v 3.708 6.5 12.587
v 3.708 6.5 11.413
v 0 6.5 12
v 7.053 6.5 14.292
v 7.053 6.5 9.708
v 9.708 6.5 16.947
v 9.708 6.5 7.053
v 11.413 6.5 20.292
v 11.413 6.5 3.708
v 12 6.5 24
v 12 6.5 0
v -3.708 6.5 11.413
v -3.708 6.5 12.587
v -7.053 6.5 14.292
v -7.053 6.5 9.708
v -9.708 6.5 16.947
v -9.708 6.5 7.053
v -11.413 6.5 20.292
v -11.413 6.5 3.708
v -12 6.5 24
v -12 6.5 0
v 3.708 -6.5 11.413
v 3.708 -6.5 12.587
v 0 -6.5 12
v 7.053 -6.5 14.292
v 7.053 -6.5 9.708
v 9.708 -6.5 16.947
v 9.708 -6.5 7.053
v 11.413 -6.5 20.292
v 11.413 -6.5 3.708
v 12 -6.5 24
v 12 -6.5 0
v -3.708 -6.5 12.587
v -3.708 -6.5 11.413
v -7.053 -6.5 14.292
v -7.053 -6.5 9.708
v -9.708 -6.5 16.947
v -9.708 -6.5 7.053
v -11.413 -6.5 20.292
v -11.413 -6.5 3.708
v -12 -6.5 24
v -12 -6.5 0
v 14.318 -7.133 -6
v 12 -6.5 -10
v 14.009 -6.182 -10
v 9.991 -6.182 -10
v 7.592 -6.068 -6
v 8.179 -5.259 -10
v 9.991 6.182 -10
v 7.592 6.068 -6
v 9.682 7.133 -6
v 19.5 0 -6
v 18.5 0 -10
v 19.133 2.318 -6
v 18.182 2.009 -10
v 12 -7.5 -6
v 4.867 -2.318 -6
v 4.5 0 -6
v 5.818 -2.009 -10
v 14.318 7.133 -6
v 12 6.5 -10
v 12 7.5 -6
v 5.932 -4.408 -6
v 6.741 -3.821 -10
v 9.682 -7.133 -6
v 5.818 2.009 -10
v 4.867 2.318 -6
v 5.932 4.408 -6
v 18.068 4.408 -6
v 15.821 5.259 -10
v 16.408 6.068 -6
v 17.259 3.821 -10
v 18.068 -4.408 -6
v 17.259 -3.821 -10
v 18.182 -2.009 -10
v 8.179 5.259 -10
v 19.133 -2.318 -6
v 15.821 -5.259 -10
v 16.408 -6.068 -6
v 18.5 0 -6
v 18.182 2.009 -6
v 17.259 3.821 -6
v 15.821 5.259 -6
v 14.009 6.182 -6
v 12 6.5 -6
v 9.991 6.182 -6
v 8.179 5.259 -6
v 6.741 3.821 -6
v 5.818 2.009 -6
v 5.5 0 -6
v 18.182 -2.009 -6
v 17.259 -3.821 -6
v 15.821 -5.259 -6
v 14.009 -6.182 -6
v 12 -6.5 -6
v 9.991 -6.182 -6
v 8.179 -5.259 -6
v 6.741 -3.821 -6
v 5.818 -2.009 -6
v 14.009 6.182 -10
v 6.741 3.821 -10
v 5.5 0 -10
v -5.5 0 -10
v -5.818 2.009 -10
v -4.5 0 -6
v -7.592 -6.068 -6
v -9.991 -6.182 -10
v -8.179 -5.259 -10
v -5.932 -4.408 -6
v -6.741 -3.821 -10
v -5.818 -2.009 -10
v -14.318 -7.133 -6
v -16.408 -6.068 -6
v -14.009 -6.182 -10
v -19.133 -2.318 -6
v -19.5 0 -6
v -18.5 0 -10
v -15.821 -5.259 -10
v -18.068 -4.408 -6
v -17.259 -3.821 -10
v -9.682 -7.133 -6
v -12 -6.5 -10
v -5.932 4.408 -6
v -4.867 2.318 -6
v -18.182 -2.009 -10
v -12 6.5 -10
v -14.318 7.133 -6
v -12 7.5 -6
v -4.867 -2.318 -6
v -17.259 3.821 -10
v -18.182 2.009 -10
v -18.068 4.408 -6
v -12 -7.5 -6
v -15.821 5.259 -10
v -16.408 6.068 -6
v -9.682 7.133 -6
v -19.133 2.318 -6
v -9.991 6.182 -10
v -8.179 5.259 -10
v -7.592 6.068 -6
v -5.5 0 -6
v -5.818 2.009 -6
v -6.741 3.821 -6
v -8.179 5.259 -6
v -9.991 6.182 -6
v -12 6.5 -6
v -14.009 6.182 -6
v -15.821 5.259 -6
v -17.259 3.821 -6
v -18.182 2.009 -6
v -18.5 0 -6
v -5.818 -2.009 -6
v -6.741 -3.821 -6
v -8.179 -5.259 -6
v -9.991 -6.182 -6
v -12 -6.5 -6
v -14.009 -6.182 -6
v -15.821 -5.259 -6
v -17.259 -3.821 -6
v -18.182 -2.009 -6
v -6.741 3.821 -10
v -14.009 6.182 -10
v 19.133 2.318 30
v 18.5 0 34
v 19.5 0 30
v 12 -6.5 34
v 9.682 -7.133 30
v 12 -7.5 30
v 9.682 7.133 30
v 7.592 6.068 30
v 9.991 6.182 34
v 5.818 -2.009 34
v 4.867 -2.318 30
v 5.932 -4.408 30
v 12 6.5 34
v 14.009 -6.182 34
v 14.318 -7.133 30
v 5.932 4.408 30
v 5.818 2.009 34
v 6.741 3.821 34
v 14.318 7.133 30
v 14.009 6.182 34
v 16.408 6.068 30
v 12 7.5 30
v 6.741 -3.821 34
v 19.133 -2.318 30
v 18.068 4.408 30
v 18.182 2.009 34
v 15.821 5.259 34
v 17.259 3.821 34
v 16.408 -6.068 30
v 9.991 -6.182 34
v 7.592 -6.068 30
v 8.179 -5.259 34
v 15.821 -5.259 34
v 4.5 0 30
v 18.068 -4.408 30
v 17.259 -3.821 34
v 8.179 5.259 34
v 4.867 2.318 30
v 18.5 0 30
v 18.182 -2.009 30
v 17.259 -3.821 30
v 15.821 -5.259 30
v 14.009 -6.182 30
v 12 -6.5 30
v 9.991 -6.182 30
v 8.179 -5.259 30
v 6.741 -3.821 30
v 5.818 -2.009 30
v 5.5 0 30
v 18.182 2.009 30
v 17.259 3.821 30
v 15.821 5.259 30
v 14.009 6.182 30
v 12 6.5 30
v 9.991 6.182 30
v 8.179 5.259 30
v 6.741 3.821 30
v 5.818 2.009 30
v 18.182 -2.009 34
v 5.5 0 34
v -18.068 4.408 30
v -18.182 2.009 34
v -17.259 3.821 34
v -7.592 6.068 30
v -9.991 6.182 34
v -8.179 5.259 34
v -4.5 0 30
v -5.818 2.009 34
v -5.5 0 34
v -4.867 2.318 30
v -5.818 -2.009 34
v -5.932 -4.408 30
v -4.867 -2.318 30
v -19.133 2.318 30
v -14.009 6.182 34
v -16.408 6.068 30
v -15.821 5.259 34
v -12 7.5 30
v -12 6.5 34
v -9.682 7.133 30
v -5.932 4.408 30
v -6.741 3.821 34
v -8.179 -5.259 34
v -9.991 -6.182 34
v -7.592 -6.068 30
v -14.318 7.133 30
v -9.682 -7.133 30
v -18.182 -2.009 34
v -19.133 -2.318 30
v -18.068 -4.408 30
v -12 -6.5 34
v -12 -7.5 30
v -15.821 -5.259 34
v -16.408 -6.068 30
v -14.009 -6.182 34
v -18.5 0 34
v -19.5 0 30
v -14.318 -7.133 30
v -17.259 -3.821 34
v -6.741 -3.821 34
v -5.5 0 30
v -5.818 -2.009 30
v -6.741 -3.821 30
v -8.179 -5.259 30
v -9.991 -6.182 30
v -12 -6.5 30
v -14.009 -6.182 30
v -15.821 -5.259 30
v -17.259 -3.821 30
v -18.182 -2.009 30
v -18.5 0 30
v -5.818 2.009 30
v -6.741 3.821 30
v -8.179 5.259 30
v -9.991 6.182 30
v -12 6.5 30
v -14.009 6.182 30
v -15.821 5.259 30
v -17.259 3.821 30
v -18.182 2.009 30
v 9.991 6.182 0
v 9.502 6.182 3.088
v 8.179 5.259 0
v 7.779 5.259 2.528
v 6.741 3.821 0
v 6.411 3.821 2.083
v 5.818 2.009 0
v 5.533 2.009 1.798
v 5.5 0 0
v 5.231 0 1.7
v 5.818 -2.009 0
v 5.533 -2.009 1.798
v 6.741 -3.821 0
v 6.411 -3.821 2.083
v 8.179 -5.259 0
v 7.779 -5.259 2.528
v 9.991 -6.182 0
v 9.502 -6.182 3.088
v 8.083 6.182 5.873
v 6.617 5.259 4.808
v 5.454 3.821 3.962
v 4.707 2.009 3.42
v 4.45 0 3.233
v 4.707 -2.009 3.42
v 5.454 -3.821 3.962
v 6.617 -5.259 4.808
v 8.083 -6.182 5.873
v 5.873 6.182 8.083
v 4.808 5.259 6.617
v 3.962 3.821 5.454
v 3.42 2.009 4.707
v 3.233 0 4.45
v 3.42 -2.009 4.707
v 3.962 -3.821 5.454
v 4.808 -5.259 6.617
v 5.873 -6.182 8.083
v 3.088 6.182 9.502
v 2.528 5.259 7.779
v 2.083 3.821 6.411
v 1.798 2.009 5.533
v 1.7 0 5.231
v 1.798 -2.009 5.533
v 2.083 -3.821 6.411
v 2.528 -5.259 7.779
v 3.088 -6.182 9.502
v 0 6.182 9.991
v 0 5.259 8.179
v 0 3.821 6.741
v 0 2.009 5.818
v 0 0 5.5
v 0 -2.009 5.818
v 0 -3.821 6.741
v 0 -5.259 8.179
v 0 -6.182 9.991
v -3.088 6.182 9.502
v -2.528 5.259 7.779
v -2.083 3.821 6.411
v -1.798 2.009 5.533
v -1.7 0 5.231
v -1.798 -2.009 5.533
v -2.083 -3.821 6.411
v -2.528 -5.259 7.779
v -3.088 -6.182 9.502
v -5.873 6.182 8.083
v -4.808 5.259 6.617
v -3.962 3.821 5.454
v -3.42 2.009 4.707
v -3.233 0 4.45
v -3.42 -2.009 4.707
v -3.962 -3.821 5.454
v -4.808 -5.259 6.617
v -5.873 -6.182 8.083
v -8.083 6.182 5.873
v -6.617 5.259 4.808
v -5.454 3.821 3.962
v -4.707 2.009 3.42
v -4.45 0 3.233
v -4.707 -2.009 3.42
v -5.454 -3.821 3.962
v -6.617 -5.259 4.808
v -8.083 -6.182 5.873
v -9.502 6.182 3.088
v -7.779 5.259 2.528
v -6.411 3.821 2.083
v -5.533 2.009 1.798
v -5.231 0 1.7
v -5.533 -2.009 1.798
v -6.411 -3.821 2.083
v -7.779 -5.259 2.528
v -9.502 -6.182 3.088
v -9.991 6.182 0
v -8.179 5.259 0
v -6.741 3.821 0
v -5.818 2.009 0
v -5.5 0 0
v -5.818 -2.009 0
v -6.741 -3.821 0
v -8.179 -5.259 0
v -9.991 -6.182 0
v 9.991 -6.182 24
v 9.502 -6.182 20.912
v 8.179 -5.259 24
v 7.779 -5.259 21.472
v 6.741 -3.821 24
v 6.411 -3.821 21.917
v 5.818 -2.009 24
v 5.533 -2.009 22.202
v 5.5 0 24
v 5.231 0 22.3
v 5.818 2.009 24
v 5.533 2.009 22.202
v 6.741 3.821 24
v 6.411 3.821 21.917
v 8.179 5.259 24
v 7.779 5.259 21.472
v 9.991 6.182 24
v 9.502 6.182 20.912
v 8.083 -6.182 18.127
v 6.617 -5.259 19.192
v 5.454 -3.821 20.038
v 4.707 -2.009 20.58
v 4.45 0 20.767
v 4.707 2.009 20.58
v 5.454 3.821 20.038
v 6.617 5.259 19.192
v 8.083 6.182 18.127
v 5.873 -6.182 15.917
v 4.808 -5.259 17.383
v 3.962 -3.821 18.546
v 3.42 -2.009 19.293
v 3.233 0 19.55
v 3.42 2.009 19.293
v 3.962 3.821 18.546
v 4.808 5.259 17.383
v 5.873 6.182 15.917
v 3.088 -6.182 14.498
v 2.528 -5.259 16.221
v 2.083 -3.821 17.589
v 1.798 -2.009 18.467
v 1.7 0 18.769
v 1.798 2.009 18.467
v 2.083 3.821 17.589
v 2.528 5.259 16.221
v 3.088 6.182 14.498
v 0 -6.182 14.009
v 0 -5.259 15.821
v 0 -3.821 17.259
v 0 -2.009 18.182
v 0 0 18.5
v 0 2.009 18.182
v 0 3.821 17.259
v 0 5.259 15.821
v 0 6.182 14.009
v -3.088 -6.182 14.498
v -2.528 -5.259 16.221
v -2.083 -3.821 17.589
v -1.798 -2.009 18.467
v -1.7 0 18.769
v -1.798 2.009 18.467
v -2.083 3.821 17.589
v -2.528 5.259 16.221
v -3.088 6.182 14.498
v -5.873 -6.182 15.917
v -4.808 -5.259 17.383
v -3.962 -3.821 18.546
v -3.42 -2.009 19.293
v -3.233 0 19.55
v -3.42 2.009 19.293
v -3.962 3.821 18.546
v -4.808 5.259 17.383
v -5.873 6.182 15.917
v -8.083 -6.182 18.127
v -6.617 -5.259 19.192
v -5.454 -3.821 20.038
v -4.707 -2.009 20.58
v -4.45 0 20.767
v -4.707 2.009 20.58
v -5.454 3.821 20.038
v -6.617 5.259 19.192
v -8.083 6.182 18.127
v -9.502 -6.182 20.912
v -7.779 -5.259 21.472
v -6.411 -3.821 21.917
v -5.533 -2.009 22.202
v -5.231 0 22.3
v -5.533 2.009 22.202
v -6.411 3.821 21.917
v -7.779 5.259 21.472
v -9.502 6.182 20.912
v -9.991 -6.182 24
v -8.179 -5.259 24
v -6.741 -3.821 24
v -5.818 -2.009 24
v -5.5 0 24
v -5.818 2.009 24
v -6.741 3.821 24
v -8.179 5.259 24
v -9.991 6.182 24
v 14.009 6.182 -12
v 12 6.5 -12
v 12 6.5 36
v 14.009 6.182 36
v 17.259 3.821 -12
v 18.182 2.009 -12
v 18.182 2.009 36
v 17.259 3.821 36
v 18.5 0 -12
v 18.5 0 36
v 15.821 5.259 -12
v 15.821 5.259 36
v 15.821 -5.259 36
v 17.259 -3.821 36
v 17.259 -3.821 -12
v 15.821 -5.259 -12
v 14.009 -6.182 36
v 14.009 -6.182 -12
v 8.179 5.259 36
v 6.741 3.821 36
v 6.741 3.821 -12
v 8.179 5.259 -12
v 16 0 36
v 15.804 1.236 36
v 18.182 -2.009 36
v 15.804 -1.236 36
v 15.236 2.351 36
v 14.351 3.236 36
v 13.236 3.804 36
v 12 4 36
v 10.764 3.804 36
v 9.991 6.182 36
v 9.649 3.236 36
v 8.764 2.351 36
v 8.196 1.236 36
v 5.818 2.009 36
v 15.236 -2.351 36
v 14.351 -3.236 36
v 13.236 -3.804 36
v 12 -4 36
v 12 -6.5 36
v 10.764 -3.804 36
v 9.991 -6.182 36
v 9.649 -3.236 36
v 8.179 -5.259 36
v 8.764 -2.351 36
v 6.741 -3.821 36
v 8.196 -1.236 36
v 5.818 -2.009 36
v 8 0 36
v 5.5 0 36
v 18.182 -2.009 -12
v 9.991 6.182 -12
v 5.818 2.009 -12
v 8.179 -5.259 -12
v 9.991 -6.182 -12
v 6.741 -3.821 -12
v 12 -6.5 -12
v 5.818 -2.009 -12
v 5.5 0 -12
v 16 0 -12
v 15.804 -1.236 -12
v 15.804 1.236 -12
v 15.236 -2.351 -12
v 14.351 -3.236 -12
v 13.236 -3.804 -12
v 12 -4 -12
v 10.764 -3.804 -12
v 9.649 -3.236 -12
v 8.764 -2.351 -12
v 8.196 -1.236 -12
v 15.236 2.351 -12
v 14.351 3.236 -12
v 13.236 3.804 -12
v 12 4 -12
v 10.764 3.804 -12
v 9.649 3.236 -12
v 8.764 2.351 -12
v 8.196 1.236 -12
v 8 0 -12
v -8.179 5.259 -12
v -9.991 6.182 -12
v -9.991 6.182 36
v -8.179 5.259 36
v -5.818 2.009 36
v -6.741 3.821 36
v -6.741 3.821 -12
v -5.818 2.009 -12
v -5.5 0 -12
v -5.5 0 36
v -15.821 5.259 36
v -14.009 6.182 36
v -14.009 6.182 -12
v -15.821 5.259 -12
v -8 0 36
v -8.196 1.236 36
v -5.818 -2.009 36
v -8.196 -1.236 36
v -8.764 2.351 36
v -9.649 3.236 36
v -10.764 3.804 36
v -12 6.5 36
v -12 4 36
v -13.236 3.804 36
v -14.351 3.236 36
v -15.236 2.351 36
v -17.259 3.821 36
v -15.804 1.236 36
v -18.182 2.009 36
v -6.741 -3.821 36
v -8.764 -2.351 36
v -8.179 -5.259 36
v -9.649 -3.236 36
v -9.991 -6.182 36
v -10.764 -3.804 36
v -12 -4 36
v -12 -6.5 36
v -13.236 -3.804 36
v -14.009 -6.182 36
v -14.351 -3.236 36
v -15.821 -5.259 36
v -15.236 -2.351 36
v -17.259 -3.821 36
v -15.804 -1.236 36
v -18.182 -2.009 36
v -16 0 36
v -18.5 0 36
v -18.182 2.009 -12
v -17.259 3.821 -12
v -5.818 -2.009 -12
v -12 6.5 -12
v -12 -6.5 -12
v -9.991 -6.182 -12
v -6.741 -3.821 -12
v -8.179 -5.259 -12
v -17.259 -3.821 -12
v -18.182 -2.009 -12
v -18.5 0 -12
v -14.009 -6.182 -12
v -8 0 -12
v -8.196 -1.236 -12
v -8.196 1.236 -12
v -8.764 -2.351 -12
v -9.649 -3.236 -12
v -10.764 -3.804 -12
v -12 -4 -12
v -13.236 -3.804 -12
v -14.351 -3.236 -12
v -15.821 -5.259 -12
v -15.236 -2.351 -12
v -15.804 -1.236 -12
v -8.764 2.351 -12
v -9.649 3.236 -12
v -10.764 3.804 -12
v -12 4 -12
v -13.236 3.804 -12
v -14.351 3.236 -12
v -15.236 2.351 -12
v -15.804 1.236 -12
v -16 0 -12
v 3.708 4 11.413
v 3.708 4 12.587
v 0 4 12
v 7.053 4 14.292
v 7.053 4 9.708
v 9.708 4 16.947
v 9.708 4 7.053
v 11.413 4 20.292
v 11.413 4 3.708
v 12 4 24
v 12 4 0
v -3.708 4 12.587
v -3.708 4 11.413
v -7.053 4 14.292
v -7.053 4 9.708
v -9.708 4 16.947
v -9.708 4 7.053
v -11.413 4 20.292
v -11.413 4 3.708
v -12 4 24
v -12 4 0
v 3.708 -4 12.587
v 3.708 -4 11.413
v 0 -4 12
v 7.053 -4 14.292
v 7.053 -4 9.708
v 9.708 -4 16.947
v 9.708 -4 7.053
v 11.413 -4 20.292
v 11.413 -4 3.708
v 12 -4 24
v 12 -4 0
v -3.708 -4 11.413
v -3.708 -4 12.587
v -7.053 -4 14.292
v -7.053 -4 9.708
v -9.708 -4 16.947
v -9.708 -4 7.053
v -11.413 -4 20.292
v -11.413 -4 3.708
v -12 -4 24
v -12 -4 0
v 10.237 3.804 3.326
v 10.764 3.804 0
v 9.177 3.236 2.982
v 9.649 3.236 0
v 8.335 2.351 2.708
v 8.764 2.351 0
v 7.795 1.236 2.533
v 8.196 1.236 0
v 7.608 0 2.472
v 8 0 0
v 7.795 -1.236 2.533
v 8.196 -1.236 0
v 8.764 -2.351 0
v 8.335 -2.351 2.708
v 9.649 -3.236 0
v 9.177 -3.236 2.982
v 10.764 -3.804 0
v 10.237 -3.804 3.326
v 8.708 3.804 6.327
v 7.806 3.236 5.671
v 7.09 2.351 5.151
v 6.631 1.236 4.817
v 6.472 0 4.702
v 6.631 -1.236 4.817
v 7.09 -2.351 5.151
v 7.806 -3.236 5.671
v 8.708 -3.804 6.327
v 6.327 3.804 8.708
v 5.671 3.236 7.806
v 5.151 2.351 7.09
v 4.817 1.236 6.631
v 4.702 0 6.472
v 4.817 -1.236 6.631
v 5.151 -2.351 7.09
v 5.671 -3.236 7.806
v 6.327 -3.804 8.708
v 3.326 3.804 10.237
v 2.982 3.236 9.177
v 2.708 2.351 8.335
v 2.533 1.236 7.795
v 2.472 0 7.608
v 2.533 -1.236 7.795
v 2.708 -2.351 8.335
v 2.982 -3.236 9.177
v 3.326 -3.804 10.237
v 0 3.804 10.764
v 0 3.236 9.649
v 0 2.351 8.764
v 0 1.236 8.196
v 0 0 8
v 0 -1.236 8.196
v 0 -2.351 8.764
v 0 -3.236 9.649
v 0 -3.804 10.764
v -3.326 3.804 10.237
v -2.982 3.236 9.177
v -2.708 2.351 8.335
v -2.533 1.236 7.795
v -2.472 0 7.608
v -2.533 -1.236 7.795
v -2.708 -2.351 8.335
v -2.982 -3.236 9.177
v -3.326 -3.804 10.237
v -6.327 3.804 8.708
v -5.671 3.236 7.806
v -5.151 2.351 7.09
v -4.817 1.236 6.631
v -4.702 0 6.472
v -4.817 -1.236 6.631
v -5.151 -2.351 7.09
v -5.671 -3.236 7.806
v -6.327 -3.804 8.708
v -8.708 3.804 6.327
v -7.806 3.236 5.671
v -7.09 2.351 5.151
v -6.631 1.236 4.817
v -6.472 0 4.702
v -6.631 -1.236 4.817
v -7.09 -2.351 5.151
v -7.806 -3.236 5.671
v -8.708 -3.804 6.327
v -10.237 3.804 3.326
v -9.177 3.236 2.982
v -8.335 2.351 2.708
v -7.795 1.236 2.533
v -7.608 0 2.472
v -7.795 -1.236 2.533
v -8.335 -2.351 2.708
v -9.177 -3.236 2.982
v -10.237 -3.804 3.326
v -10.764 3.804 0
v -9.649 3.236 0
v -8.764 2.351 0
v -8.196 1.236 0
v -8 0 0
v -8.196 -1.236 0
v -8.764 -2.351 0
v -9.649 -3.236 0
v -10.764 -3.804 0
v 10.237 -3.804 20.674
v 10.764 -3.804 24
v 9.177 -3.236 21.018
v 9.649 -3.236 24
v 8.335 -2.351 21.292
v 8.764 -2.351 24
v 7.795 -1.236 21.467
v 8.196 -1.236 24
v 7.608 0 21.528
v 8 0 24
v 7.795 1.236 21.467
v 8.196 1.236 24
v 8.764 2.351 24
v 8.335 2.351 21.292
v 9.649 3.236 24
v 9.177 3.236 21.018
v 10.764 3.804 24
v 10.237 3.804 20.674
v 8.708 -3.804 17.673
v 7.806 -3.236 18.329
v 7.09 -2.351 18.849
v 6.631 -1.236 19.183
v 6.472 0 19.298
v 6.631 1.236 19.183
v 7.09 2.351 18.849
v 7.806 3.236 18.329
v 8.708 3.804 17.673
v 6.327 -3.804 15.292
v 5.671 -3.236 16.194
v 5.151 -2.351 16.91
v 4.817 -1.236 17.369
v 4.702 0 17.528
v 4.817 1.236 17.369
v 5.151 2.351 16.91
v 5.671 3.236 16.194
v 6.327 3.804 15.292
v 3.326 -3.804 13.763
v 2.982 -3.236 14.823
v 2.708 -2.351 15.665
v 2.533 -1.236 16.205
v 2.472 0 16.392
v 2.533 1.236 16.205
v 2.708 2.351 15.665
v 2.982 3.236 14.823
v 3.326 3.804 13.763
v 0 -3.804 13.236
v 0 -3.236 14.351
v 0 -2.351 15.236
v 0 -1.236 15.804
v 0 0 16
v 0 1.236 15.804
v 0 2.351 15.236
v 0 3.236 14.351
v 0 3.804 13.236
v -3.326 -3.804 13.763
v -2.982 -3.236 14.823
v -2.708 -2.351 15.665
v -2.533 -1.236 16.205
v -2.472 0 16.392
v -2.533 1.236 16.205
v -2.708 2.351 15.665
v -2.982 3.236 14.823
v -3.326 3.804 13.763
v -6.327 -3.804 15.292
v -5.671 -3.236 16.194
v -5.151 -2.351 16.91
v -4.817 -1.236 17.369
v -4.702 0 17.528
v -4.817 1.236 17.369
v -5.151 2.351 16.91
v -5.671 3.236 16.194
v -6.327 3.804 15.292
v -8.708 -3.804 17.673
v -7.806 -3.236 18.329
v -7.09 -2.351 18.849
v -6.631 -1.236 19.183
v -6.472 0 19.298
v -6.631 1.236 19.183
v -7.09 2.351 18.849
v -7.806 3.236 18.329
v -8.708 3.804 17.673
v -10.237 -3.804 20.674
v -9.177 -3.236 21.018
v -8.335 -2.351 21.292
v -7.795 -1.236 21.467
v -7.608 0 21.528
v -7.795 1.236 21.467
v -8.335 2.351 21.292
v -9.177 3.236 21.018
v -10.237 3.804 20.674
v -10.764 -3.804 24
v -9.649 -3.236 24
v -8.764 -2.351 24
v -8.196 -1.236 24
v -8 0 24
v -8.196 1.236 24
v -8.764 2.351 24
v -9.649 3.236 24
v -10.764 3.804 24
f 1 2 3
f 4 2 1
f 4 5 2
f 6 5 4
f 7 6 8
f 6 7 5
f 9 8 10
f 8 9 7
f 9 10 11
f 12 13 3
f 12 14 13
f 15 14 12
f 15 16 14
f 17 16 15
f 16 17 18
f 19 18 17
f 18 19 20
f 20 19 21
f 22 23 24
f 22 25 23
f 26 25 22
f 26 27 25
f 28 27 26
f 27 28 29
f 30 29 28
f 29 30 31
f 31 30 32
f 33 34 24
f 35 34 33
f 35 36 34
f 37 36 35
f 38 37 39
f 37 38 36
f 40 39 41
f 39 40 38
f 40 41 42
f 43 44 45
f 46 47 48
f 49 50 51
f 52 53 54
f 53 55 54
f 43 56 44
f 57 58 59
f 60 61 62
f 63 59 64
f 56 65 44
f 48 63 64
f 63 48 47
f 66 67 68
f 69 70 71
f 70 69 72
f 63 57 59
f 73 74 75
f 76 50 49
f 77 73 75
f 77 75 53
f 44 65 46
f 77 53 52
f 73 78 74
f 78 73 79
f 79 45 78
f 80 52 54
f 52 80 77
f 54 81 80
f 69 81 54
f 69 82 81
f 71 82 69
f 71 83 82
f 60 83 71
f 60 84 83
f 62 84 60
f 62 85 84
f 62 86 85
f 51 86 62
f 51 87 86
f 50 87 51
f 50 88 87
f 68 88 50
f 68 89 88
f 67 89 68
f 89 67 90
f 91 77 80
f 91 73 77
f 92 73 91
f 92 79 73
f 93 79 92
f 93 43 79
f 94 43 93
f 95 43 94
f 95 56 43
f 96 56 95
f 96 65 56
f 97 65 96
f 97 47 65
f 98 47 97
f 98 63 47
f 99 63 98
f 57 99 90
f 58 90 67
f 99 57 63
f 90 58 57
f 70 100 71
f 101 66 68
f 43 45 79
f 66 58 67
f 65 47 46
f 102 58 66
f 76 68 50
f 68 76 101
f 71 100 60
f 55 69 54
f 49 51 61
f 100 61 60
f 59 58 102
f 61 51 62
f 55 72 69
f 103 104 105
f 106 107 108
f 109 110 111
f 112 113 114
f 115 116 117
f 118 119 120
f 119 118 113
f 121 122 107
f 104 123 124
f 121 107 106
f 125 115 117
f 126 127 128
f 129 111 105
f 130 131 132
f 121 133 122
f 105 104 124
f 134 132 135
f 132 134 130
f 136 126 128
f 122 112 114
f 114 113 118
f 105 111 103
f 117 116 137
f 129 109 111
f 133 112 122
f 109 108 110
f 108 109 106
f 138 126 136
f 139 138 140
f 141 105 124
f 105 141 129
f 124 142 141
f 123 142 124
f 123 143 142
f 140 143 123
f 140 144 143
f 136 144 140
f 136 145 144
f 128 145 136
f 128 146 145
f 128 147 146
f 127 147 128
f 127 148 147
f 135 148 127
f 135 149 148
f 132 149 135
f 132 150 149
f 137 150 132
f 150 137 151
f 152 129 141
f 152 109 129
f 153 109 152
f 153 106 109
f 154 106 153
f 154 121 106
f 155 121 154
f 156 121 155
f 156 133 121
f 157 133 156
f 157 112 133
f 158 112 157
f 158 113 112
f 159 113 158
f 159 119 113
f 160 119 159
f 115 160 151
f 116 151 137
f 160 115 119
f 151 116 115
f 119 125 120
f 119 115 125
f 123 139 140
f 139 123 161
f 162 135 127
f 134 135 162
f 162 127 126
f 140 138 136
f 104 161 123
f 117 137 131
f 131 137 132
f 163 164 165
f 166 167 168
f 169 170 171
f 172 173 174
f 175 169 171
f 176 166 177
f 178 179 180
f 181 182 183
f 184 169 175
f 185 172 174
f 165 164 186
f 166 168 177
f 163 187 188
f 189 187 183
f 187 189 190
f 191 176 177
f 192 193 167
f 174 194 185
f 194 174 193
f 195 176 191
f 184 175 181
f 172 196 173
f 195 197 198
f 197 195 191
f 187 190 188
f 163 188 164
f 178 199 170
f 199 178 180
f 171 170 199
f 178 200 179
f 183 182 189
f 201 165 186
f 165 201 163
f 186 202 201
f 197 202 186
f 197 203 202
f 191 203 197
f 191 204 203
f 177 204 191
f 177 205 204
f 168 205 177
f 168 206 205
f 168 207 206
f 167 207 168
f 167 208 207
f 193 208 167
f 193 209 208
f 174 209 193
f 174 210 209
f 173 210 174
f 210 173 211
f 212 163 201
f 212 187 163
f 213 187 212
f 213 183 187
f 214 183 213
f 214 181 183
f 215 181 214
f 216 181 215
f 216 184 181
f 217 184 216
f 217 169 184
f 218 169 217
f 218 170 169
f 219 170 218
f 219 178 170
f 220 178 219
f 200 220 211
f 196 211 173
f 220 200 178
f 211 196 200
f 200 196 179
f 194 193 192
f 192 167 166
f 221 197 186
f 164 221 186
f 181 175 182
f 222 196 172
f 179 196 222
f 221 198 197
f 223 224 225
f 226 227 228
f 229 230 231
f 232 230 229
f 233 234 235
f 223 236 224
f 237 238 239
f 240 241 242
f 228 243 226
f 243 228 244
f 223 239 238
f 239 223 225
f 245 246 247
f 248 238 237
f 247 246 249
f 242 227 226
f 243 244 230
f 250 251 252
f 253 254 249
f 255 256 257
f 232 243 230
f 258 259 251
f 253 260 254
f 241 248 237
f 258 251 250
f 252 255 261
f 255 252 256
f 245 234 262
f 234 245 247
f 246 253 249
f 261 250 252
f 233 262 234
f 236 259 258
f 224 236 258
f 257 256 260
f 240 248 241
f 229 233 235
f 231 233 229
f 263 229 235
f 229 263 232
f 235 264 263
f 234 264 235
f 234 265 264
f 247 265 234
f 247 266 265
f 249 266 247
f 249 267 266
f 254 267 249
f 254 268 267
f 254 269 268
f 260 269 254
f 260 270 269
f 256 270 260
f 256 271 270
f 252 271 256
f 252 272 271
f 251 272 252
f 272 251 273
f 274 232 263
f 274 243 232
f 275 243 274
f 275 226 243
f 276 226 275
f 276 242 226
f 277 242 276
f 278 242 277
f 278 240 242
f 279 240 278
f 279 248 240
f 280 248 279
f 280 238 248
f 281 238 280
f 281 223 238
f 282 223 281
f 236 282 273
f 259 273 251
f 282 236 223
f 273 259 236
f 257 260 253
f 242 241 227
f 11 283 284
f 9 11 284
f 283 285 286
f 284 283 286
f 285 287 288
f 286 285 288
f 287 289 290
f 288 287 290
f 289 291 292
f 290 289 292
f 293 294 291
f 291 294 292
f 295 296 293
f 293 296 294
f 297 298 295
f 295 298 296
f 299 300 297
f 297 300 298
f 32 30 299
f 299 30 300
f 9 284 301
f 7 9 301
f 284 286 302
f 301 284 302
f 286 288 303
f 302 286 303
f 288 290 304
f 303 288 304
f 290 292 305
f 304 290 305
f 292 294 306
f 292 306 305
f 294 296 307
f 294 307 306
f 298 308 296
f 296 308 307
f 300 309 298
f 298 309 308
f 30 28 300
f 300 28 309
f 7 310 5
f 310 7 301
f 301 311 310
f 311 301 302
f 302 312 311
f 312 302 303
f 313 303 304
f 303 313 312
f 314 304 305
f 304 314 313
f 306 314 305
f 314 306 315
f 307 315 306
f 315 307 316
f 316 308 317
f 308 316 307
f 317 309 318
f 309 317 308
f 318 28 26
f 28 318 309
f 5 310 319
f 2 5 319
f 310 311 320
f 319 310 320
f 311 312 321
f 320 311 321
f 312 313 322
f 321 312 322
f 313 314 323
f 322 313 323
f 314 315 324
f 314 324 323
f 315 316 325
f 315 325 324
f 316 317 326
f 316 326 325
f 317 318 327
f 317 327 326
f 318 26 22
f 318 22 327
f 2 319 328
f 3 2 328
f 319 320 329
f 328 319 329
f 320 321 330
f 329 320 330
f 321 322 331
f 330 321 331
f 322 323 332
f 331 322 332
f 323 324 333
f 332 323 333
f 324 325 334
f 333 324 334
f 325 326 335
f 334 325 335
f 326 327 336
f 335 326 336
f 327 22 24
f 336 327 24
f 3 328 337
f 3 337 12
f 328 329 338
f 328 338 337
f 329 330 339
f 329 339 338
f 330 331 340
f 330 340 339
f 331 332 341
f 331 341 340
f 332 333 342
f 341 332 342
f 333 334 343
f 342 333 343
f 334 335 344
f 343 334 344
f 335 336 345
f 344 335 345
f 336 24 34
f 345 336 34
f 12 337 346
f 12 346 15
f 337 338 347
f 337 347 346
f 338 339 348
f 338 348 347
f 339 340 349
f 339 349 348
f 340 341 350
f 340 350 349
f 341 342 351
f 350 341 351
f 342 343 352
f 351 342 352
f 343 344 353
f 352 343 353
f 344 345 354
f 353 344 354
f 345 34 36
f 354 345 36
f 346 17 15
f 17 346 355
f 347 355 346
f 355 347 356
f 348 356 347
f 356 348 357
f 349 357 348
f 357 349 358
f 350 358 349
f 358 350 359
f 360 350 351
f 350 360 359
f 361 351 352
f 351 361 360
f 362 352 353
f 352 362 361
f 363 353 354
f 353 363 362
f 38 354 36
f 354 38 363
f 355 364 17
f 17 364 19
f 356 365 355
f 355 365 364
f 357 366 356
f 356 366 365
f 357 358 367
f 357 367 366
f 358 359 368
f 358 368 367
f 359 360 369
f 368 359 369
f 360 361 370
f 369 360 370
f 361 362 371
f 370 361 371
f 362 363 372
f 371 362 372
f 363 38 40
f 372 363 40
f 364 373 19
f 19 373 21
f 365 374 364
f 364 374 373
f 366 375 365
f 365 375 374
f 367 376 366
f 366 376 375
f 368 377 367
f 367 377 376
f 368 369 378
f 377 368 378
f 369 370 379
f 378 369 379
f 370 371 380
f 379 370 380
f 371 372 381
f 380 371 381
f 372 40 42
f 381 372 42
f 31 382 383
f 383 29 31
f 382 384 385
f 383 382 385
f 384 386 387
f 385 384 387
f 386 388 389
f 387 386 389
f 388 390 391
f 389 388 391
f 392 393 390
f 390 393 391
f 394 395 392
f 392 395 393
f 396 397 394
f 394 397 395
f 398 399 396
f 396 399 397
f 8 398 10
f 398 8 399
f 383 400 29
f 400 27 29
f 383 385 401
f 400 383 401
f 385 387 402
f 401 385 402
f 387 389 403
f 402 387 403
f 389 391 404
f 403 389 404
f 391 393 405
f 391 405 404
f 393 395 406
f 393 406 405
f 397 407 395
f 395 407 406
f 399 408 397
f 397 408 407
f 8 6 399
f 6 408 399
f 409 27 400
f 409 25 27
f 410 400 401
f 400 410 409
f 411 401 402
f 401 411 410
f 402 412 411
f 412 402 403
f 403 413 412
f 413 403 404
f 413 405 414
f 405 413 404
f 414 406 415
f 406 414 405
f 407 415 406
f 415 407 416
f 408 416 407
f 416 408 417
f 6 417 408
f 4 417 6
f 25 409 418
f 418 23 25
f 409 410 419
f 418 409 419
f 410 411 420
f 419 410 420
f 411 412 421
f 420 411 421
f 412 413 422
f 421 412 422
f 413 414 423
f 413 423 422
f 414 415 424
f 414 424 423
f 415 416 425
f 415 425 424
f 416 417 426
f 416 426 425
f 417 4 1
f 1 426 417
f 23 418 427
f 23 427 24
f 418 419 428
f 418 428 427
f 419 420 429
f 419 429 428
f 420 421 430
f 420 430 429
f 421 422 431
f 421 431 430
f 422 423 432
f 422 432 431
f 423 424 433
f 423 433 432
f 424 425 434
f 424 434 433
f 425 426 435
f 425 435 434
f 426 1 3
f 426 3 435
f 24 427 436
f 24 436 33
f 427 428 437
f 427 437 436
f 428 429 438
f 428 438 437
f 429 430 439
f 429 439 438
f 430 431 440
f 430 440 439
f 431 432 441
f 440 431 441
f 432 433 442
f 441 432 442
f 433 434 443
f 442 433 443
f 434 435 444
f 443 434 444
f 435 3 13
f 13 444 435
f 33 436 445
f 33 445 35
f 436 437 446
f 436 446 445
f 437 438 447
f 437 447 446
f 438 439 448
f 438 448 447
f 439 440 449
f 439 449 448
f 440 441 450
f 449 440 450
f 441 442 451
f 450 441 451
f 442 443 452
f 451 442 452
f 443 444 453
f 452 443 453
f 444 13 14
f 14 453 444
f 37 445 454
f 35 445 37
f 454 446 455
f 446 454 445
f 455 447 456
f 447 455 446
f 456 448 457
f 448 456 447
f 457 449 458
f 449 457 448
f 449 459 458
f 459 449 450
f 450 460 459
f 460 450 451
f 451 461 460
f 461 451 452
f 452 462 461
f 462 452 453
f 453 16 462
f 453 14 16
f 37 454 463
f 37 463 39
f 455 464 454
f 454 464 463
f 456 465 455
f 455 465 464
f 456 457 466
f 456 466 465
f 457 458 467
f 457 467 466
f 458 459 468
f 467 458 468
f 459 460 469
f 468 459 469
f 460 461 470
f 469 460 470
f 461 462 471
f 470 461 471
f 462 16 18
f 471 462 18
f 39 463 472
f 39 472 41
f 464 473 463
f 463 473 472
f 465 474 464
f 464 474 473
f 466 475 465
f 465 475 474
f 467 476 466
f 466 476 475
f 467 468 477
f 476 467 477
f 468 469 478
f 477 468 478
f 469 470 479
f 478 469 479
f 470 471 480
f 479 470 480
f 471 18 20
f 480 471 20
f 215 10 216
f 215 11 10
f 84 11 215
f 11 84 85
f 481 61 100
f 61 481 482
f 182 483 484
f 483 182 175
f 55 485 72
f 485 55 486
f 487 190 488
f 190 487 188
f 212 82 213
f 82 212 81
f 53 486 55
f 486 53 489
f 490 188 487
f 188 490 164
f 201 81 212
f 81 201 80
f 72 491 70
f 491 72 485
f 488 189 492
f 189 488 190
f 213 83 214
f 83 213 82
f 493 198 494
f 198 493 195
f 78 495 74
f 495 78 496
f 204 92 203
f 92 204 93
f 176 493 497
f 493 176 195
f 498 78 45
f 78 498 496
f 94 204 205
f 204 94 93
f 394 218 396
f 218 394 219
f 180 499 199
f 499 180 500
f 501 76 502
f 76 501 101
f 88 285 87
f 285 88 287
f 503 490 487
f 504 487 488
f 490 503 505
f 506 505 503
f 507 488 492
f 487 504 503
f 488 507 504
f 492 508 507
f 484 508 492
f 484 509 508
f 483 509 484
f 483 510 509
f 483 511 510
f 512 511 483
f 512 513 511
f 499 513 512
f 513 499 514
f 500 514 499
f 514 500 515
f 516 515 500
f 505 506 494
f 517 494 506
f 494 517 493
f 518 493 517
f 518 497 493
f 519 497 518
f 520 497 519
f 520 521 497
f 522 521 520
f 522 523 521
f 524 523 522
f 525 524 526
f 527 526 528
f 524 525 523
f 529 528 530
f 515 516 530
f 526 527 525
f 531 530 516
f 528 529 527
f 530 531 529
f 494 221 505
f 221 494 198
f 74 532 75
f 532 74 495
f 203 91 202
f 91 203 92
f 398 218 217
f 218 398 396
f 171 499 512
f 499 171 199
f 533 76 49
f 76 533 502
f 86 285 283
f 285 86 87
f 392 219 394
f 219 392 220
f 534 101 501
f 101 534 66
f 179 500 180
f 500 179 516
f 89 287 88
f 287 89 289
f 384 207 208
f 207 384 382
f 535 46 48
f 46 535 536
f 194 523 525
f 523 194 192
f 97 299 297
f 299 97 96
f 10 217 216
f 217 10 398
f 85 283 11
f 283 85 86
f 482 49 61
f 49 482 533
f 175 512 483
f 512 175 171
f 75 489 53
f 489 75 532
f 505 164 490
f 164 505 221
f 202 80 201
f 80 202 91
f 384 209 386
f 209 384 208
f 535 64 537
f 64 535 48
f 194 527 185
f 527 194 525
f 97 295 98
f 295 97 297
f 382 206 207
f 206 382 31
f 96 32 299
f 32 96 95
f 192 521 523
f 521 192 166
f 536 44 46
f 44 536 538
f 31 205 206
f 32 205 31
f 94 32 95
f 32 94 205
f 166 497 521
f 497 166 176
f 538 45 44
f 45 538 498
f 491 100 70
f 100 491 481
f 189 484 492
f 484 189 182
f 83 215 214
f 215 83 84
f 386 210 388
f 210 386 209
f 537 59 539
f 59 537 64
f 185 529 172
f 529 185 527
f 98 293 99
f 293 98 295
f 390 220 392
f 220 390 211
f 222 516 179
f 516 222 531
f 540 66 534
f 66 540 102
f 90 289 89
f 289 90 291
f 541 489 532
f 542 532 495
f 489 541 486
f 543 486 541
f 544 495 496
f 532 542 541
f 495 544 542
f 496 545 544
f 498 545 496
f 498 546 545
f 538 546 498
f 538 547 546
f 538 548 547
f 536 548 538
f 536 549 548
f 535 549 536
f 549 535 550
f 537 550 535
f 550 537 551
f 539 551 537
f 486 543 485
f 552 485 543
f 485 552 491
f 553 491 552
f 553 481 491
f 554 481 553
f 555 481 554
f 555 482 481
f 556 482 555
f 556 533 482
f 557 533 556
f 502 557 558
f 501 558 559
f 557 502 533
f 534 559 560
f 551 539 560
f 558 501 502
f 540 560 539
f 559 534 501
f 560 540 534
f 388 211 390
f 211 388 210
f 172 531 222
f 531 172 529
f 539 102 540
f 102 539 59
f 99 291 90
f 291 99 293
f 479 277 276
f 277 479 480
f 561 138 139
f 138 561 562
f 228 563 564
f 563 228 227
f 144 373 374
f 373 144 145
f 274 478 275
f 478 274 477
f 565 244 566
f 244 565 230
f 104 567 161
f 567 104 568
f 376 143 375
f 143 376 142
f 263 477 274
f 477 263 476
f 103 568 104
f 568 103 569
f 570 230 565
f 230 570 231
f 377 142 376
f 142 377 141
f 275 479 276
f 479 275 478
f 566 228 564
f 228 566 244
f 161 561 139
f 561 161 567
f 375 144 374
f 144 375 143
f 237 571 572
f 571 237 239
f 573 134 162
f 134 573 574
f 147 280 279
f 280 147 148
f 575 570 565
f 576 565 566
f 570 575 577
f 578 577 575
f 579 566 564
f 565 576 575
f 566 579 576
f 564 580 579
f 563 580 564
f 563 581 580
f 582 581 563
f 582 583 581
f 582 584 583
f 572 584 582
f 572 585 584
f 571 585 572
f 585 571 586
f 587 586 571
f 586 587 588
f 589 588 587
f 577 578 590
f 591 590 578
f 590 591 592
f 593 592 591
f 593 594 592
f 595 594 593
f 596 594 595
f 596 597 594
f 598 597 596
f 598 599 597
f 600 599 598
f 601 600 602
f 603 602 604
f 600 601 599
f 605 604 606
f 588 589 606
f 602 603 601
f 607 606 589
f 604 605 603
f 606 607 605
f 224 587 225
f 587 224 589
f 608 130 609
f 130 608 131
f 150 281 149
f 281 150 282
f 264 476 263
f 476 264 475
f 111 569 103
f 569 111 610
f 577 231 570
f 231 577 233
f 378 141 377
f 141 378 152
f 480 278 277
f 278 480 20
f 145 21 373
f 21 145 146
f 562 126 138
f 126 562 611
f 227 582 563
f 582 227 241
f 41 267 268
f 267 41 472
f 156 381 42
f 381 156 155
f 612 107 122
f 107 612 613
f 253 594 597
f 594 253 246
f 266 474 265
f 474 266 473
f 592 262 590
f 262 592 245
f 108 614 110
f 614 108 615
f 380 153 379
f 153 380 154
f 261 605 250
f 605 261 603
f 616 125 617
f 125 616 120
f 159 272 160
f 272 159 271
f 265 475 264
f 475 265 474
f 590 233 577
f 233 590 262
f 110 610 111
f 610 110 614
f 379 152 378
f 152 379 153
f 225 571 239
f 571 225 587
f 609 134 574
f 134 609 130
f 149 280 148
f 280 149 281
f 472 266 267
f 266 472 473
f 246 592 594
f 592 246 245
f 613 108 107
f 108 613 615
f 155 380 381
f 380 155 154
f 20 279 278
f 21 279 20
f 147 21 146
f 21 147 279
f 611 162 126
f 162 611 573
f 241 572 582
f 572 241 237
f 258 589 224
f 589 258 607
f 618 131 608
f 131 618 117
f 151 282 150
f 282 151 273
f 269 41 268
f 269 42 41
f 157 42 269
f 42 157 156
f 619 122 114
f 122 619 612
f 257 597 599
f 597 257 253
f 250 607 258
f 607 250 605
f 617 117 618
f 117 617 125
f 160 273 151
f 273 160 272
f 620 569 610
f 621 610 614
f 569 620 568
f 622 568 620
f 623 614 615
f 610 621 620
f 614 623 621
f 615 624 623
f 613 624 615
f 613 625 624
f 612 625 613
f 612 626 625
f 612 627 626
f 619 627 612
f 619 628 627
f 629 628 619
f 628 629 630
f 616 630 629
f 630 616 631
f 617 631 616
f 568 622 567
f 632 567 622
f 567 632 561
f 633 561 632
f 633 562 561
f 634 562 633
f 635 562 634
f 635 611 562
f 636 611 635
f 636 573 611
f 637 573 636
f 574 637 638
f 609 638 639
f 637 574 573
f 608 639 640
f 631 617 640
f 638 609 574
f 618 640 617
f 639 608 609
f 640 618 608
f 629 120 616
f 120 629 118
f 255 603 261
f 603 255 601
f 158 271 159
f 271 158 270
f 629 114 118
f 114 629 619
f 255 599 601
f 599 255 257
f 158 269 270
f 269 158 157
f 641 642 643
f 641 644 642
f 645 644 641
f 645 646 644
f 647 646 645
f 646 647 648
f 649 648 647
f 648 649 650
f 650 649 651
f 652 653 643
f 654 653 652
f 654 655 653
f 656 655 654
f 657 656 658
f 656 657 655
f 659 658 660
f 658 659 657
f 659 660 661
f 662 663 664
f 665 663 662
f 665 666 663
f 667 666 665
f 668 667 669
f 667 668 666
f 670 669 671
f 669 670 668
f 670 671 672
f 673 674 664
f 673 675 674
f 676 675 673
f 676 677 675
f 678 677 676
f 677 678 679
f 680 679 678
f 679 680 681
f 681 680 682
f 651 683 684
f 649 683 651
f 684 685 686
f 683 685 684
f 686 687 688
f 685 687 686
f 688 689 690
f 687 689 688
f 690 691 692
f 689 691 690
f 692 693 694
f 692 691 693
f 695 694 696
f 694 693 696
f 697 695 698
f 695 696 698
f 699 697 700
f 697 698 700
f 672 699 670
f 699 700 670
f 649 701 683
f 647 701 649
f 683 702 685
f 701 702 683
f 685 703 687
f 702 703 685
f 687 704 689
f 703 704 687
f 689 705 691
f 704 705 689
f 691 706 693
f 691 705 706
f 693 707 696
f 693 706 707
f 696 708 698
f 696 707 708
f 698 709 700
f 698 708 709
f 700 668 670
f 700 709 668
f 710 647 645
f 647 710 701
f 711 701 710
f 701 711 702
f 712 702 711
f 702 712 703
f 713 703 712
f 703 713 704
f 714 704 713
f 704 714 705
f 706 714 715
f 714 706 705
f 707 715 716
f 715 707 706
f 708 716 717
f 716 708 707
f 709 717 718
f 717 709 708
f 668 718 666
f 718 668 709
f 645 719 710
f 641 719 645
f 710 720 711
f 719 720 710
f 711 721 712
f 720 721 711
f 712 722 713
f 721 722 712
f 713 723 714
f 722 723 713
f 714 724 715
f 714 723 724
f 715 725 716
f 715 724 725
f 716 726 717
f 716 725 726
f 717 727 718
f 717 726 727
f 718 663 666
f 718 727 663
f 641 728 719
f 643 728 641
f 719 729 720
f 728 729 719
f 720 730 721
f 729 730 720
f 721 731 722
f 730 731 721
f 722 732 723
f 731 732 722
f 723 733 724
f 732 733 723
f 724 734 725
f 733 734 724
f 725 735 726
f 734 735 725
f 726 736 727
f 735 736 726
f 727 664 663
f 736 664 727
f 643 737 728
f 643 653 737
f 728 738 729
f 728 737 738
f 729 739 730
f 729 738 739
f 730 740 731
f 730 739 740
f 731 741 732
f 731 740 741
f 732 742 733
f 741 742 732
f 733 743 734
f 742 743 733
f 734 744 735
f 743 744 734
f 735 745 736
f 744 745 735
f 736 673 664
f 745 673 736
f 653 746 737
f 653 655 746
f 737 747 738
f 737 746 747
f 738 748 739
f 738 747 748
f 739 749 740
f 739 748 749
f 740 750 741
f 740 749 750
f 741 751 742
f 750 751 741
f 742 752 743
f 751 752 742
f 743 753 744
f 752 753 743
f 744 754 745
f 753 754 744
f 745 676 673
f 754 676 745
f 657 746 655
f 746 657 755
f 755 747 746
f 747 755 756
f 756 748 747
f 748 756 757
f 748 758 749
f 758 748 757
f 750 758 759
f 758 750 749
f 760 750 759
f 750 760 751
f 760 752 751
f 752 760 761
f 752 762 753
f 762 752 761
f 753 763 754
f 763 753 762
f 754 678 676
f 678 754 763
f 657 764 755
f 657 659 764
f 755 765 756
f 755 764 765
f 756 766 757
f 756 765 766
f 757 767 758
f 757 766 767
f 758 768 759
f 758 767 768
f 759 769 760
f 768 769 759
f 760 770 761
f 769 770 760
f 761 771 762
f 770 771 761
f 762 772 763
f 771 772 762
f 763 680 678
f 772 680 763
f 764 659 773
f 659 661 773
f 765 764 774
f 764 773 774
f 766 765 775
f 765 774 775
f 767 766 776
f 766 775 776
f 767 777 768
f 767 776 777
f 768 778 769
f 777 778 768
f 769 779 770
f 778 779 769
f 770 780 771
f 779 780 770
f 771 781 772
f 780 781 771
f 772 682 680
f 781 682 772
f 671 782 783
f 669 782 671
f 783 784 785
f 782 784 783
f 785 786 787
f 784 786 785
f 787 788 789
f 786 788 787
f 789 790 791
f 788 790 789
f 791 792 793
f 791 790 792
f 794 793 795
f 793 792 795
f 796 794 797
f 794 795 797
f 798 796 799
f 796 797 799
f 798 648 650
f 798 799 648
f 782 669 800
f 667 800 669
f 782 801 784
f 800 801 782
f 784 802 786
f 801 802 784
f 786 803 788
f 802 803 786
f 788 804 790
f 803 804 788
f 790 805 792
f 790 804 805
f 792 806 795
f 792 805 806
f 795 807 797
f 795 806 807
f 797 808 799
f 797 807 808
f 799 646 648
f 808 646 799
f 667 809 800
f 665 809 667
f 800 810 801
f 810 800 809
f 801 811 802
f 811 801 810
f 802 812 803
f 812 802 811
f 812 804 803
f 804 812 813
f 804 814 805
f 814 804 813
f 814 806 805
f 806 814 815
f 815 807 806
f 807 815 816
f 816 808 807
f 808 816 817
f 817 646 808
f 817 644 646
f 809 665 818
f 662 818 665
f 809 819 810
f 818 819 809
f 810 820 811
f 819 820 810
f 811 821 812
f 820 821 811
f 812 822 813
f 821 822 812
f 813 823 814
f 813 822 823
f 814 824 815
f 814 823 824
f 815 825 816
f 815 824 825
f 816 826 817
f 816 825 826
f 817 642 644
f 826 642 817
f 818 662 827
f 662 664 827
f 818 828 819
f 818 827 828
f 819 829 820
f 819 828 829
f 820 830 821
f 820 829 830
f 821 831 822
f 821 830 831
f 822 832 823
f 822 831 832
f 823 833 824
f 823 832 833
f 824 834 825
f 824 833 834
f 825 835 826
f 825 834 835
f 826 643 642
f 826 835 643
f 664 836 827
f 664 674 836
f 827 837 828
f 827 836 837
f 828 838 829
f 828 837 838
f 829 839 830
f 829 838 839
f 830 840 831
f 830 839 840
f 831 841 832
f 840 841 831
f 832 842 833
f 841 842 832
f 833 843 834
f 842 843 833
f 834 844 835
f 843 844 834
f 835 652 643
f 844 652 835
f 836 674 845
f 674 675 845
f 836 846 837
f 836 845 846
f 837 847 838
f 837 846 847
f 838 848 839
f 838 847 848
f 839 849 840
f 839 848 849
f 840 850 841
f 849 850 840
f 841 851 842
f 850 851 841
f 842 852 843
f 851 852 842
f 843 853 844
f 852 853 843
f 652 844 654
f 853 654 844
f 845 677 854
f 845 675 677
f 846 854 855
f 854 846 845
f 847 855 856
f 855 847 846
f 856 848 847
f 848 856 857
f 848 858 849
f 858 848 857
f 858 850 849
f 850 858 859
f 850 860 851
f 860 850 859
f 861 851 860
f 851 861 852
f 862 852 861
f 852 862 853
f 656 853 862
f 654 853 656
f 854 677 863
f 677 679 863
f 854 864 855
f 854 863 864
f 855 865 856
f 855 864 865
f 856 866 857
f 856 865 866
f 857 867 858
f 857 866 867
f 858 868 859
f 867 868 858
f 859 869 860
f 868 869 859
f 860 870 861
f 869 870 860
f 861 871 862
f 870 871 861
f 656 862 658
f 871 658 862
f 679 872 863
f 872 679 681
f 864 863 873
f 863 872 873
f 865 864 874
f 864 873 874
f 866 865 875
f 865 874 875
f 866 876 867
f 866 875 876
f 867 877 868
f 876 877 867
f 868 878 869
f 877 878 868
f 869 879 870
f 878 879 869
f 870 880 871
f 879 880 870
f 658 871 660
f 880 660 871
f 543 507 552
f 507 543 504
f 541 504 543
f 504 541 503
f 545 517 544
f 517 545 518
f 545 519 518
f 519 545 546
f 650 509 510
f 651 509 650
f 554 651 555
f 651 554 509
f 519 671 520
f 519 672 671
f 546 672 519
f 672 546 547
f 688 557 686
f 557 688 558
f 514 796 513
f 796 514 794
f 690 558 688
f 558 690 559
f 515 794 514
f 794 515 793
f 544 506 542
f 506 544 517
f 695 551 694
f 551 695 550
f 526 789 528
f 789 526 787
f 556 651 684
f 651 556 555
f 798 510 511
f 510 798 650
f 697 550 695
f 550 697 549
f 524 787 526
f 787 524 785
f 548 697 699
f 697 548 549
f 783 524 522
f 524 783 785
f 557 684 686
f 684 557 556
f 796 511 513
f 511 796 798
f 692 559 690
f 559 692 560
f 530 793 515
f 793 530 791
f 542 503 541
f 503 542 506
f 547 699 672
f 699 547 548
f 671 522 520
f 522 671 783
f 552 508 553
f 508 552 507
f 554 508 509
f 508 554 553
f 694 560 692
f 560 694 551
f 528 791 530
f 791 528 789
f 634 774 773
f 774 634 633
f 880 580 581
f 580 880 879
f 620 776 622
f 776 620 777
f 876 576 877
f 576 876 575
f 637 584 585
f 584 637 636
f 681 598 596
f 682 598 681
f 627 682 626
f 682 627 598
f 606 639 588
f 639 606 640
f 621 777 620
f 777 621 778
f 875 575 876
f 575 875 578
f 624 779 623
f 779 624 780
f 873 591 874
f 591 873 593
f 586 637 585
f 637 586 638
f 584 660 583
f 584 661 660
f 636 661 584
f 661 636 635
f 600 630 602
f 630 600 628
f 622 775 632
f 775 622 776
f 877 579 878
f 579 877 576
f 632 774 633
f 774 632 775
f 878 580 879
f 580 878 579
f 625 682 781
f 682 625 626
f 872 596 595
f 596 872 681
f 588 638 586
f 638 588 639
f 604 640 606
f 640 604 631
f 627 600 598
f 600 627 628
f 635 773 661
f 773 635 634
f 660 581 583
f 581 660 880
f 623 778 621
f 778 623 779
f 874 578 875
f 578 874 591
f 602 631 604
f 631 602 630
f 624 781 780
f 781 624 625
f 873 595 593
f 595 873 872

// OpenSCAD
$fn = 20;

epsilon = 0.1;

jointOuterDiameter = 13;
jointInnerDiameter = 8;
jointFlaredDiameter = 15;

spigotLength = 15;
module Spigot()
{
    difference()
    {
        union()
        {
            cylinder(h=spigotLength,d=jointOuterDiameter);
            translate([0,0,7])
            cylinder(h=6,d1=jointFlaredDiameter,d2=jointOuterDiameter);
            
        }
        union()
        {
            translate([0,0,-epsilon])
            cylinder(h=spigotLength+2*epsilon,d=jointInnerDiameter);
        }
        
    }
    
}

bendRadius = 12;


module LittleH(diameter, bendRadius, armLength, addBarbs, barbDiameter, barbHeight, barbInset)
{

    
    
    rotate([90,0,0])
        rotate_extrude(convexity=10, angle=90) translate(v=[bendRadius,0,0]) circle(d=diameter); 

    translate([0,0,bendRadius*2])
        rotate([-90,0,0])
            rotate_extrude(convexity=10, angle=180) translate(v=[bendRadius,0,0]) circle(d=diameter); 
    translate([bendRadius,0,-armLength])
            cylinder(h=bendRadius*2+2*armLength,d=diameter);
    translate([-bendRadius,0,2*bendRadius])
            cylinder(h=armLength,d=diameter);
    
    if (addBarbs)
    {
        translate([bendRadius,0,-(armLength-barbInset)])
            cylinder(d1=diameter, d2=barbDiameter,  h=barbHeight);
        
        translate([bendRadius,0,2*bendRadius + armLength-barbInset-barbHeight])
            cylinder(d2=diameter, d1=barbDiameter,  h=barbHeight);
        
        translate([-bendRadius,0,2*bendRadius + armLength-barbInset-barbHeight])
            cylinder(d2=diameter, d1=barbDiameter,  h=barbHeight);
    }
}



module BigH(diameter, bendRadius, armLength, addBarbs, barbDiameter, barbHeight, barbInset)
{
    difference()
    {
        union()
        {
            translate([-bendRadius,-diameter/2,0])
                cube([2*bendRadius,diameter,bendRadius]);
        }
        union()
        {
            translate([0,(diameter+2*epsilon)/2,0])
            rotate([90,0,0])
                cylinder(r=bendRadius,h=diameter+2*epsilon);
        }
    }

    translate([0,0,2*bendRadius])
    rotate([0,180,0])
    difference()
    {
        union()
        {
            translate([-bendRadius,-diameter/2,0])
                cube([2*bendRadius,diameter,bendRadius]);
        }
        union()
        {
            translate([0,(diameter+2*epsilon)/2,0])
            rotate([90,0,0])
                cylinder(r=bendRadius,h=diameter+2*epsilon);
        }
    }

    
    rotate([90,0,0])
        rotate_extrude(convexity=10, angle=180) translate(v=[bendRadius,0,0]) circle(d=diameter); 

    translate([0,0,bendRadius*2])
        rotate([-90,0,0])
            rotate_extrude(convexity=10, angle=180) translate(v=[bendRadius,0,0]) circle(d=diameter); 
    translate([bendRadius,0,-armLength])
            cylinder(h=bendRadius*2+2*armLength,d=diameter);
    translate([-bendRadius,0,-armLength])
            cylinder(h=bendRadius*2+2*armLength,d=diameter);
    
    if (addBarbs)
    {
        translate([bendRadius,0,-(armLength-barbInset)])
            cylinder(d1=diameter, d2=barbDiameter,  h=barbHeight);
        
        translate([-bendRadius,0,-(armLength-barbInset)])
            cylinder(d1=diameter, d2=barbDiameter,  h=barbHeight);
        
        translate([bendRadius,0,2*bendRadius + armLength-barbInset-barbHeight])
            cylinder(d2=diameter, d1=barbDiameter,  h=barbHeight);
        
        translate([-bendRadius,0,2*bendRadius + armLength-barbInset-barbHeight])
            cylinder(d2=diameter, d1=barbDiameter,  h=barbHeight);
    }
}


module HJoint()
{
    intersection()
    {
        difference()
        {
            union()
            {
                rotate([90,0,0])
                     rotate_extrude(convexity=10, angle=90) translate(v=[bendRadius,0,0]) circle(d=jointOuterDiameter); 

                translate([0,0,bendRadius*2])
                    rotate([-90,0,0])
                        rotate_extrude(convexity=10, angle=180) translate(v=[bendRadius,0,0]) circle(d=jointOuterDiameter); 
 //               translate([-15,0,0])
  //                  cylinder(h=30,d=jointOuterDiameter);
                translate([bendRadius,0,0])
                    cylinder(h=30,d=jointOuterDiameter);
                
                
            }
            union()
            {
                rotate([90,0,0])
                     rotate_extrude(convexity=10, angle=90) translate(v=[bendRadius,0,0]) circle(d=jointInnerDiameter); 

                translate([0,0,bendRadius*2])
                    rotate([-90,0,0])
                        rotate_extrude(convexity=10, angle=180) translate(v=[bendRadius,0,0]) circle(d=jointInnerDiameter); 
                
                                
  //              translate([-15,0,0])
  //                  cylinder(h=30,d=jointInnerDiameter);
                translate([bendRadius,0,0])
                    cylinder(h=30,d=jointInnerDiameter);
            }
        }
        translate([-30,-30,0])
            cube([60,60,30]);
    }
    
//    translate([-15,0,0])
//    rotate([180,0,0])
 //       Spigot();
    translate([bendRadius,0,0])
        rotate([180,0])
        Spigot();
    
    translate([-bendRadius,0,bendRadius*2])
    
        Spigot();
    translate([bendRadius,0,bendRadius*2])
        Spigot();
}

module LittleHJoint()
{
    difference()
    {
    
        LittleH(jointOuterDiameter,12,12,true, jointFlaredDiameter,4,2);
        LittleH(jointInnerDiameter,12,12+epsilon,false, jointFlaredDiameter,4,2);
    }
}

module BigHJoint()
{
    difference()
    {
    
        BigH(jointOuterDiameter,12,12,true, jointFlaredDiameter,4,2);
        BigH(jointInnerDiameter,12,12+epsilon,false, jointFlaredDiameter,4,2);
    }
}


/*
intersection()
{
LittleHJoint();
//translate([0,5,15])
//rotate([-90,0,0])
//cylinder(d=3,h=10);

//translate([0,25,15])
//rotate([-90,0,0])
//cylinder(d=3,h=10);


//HJoint();
//translate([0,20,0])
//HJoint();
//translate([0,40,0])
//HJoint();
   // HJoint();
    translate([-50,0,-50])
    cube([100,100,100]);
}
*/


module LittleHJointPairForPrinting()
{
    rotate([0,180,0])
    LittleHJoint();
}

BigHJoint();
